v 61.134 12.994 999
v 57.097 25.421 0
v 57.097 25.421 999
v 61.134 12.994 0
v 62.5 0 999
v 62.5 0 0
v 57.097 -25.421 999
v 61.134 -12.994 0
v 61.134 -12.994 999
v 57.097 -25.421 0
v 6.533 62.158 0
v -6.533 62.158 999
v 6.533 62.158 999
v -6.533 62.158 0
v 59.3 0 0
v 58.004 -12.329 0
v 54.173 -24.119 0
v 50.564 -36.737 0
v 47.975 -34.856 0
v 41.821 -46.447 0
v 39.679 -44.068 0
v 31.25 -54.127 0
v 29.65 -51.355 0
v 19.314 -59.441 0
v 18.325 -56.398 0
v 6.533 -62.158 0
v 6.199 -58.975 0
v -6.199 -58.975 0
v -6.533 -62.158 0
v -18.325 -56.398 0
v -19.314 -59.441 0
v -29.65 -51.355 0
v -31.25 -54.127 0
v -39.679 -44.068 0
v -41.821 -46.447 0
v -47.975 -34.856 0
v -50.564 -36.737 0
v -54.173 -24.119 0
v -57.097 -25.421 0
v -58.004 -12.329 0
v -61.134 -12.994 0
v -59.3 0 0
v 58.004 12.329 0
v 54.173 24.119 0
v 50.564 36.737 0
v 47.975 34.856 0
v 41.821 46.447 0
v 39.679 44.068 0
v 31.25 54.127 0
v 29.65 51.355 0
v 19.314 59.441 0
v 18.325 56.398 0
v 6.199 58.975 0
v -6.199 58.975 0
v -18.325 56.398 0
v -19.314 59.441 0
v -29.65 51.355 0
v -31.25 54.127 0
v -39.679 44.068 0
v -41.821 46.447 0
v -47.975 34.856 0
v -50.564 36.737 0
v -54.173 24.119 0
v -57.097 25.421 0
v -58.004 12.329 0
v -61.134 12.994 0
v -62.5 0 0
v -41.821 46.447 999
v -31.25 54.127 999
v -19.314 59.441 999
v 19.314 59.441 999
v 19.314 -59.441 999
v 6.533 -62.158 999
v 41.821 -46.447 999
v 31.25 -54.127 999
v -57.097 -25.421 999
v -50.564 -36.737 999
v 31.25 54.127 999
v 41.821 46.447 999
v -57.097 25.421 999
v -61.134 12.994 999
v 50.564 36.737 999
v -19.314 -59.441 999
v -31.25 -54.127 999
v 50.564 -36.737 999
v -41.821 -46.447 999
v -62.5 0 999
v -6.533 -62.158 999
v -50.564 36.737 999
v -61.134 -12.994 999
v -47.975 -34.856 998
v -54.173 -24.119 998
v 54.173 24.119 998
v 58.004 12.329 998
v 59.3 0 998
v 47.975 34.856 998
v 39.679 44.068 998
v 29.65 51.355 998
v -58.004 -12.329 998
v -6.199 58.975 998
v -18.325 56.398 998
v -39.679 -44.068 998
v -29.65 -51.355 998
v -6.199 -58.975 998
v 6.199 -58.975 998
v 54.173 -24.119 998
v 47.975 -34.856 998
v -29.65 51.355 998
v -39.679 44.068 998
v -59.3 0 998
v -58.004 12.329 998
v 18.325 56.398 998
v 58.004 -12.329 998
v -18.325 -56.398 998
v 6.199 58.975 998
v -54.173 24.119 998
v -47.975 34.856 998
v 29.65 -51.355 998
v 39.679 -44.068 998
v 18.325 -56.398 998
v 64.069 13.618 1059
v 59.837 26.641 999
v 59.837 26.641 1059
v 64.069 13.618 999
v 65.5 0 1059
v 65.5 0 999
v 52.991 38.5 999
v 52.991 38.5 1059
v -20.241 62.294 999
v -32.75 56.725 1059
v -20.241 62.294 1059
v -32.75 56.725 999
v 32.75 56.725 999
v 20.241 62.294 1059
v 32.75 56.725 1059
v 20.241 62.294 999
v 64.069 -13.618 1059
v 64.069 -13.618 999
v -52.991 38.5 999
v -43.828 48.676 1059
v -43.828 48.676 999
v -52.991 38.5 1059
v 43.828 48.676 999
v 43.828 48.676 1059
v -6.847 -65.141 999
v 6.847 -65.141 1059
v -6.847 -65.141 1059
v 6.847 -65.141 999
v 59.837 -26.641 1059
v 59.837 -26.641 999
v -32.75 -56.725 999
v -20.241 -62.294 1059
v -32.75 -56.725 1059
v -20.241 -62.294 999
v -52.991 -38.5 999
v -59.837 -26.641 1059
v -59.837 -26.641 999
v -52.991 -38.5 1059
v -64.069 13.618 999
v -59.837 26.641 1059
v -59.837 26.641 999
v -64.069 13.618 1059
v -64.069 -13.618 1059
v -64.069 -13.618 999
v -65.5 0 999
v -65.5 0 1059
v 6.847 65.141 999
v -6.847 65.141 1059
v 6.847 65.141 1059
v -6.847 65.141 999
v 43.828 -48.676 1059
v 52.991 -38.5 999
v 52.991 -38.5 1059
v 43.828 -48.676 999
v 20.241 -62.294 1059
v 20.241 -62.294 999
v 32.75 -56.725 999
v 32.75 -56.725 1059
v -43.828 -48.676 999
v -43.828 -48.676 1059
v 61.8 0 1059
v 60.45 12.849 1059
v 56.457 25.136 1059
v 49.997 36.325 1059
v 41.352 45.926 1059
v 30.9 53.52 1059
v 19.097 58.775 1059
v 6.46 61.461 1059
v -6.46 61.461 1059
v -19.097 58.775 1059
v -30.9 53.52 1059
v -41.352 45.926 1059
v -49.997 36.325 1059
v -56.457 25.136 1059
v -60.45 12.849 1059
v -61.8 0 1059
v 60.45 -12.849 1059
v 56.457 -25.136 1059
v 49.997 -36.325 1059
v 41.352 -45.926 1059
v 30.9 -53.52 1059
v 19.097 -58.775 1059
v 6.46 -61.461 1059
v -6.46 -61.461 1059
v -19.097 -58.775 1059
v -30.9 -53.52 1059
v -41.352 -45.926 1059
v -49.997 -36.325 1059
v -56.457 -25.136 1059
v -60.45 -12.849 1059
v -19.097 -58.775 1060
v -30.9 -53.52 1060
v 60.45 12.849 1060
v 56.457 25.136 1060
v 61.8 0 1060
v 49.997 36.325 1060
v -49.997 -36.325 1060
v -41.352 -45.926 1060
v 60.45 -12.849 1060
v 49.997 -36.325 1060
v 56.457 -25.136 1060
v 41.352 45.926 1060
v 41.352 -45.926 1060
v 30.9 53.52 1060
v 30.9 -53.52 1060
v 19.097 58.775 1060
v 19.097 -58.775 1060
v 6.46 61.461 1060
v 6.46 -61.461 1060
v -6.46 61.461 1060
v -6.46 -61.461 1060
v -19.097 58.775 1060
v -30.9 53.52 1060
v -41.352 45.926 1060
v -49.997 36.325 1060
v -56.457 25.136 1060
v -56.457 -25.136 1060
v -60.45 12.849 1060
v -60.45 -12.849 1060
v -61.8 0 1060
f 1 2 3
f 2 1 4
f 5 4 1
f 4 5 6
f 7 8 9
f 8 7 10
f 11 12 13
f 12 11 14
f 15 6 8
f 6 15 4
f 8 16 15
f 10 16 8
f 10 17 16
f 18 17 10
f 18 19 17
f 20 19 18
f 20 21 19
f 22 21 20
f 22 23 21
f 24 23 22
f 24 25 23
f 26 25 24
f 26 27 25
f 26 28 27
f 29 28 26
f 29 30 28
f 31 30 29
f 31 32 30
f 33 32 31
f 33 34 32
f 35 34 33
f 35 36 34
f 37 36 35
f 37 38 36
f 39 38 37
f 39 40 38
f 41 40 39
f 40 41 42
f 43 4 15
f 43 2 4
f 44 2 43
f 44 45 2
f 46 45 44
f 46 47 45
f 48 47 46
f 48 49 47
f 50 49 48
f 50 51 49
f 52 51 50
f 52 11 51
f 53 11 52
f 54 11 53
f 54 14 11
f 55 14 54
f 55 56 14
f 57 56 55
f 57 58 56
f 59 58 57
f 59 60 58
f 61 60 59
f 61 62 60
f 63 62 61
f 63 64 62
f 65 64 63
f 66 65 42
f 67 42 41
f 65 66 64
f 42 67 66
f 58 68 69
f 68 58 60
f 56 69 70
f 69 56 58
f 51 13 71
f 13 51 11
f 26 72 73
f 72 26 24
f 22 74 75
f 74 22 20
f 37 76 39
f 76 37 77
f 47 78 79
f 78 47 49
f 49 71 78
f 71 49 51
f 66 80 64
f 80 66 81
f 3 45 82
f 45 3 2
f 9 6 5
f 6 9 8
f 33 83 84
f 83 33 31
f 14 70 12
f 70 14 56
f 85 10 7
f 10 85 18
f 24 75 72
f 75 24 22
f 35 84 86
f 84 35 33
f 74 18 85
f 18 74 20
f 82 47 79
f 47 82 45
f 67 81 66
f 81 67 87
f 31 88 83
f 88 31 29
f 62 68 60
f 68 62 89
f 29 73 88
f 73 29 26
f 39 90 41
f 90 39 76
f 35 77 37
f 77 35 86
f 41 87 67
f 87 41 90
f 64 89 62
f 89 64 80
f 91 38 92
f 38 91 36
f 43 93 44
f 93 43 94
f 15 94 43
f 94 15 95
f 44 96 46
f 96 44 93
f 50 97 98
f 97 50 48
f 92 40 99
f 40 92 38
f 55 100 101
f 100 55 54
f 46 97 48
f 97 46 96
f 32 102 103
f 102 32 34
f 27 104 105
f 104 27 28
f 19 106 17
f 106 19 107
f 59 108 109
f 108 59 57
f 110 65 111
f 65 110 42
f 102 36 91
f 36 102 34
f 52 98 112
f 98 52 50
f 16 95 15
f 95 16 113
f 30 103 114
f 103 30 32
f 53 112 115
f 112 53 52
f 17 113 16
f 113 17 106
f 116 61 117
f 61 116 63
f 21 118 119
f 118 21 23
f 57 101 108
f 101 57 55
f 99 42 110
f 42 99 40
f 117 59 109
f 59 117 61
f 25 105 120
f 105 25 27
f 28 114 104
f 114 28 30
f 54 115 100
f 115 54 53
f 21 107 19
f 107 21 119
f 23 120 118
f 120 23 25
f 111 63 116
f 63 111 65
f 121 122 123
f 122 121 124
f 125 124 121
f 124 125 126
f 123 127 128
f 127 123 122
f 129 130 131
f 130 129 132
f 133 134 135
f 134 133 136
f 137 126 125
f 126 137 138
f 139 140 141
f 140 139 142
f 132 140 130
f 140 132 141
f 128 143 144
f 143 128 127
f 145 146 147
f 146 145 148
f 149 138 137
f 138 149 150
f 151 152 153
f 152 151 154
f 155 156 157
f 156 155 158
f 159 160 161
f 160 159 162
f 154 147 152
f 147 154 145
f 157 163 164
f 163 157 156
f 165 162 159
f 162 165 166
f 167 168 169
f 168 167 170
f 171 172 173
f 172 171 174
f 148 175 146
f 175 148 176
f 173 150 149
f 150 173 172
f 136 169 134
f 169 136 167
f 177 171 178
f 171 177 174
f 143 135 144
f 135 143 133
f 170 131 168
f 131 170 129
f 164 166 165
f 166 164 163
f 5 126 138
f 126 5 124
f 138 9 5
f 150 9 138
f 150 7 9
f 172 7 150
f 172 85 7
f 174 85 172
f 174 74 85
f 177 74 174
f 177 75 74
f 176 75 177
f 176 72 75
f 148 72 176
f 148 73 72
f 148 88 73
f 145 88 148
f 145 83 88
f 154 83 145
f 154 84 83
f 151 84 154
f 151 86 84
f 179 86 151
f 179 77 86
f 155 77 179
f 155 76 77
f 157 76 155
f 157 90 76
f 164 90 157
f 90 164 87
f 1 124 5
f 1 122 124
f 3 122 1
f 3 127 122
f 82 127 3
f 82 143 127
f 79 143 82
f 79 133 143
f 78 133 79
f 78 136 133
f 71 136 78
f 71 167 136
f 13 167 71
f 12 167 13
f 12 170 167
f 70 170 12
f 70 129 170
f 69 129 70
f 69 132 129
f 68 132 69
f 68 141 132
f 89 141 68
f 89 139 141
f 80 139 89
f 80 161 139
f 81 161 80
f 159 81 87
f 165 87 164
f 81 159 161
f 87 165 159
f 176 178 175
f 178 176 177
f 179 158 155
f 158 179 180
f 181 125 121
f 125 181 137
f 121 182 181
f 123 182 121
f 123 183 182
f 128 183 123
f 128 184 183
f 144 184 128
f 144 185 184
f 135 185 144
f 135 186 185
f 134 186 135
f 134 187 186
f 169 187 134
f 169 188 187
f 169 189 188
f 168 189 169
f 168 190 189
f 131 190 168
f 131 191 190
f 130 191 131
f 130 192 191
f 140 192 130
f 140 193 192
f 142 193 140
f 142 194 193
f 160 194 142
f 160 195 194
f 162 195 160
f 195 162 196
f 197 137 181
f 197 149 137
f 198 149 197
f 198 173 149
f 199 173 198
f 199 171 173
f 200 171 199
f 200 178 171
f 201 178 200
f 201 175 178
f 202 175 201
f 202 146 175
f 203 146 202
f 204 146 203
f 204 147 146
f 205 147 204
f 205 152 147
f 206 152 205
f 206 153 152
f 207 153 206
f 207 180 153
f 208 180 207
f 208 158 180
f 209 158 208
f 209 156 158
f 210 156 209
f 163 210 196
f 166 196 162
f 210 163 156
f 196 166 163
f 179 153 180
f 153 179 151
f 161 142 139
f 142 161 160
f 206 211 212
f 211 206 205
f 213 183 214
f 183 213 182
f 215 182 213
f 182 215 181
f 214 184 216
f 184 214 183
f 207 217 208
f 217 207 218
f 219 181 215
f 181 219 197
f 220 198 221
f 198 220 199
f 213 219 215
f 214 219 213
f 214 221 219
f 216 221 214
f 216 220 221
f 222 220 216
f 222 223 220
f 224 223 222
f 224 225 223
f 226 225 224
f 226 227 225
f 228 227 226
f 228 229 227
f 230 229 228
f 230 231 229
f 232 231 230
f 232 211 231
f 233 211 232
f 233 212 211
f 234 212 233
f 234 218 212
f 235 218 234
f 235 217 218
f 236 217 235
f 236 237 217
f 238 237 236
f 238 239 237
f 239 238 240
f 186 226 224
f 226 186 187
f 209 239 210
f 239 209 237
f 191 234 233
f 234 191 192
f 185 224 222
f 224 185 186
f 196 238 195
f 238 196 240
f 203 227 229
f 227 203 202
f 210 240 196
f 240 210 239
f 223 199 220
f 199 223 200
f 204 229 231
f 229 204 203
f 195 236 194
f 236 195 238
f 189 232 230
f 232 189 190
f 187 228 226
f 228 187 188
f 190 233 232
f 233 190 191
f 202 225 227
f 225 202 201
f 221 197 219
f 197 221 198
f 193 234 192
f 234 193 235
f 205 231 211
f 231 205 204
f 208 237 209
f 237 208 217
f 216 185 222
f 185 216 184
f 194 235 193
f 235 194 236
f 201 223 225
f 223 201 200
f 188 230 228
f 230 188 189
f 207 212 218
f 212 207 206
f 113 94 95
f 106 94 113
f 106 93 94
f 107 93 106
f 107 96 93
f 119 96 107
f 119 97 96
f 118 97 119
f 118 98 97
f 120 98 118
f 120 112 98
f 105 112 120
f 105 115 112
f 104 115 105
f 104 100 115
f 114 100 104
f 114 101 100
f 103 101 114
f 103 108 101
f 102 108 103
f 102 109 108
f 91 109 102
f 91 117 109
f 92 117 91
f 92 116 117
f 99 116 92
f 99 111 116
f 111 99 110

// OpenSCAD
// Parameters
length_mm = 1000; //[500:2000:10]
ht125_outer_diameter_mm = 125; //[100:250:1]
ht125_wall_thickness_mm = 3.2; //[1.6:6.4:0.1]
include_end_fitting = 1; //[0:1:1]
fitting_socket_length_mm = 60; //[30:120:1]
fitting_socket_wall_extra_mm = 2.5; //[1:6:0.1]
fitting_socket_od_extra_mm = 6; //[2:15:0.5]
fitting_stop_ring_thickness_mm = 4; //[2:10:0.5]
fitting_stop_ring_radial_mm = 2; //[1:6:0.5]
overlap_mm = 1; //[0.5:2:0.1]

// Module for the HT Pipe
module ht_pipe() {
  color([0.85, 0.85, 0.8]) { // PVC color
    difference() {
      // Outer pipe cylinder
      cylinder(h=length_mm, r=ht125_outer_diameter_mm/2, center=false);
      
      // Inner void cylinder
      translate([0, 0, -overlap_mm])
        cylinder(h=length_mm + 2*overlap_mm, r=ht125_outer_diameter_mm/2 - ht125_wall_thickness_mm, center=false);
    }
    
    if (include_end_fitting) {
      // End fitting geometry
      union() {
        // Outer socket cylinder
        translate([0, 0, length_mm - overlap_mm])
          cylinder(h=fitting_socket_length_mm, r=ht125_outer_diameter_mm/2 + fitting_socket_od_extra_mm/2, center=false);
        
        // Inner socket void cylinder
        translate([0, 0, length_mm - overlap_mm - overlap_mm])
          cylinder(h=fitting_socket_length_mm + 2*overlap_mm, r=ht125_outer_diameter_mm/2 - ht125_wall_thickness_mm + fitting_socket_wall_extra_mm, center=false);
        
        // Stop ring void cylinder
        translate([0, 0, length_mm + fitting_socket_length_mm - fitting_stop_ring_thickness_mm - overlap_mm - overlap_mm])
          cylinder(h=fitting_stop_ring_thickness_mm + 2*overlap_mm, r=ht125_outer_diameter_mm/2 - ht125_wall_thickness_mm + fitting_socket_wall_extra_mm - fitting_stop_ring_radial_mm, center=false);
      }
    }
  }
}

// Assembly
module assembly() {
  ht_pipe();
}

assembly();
